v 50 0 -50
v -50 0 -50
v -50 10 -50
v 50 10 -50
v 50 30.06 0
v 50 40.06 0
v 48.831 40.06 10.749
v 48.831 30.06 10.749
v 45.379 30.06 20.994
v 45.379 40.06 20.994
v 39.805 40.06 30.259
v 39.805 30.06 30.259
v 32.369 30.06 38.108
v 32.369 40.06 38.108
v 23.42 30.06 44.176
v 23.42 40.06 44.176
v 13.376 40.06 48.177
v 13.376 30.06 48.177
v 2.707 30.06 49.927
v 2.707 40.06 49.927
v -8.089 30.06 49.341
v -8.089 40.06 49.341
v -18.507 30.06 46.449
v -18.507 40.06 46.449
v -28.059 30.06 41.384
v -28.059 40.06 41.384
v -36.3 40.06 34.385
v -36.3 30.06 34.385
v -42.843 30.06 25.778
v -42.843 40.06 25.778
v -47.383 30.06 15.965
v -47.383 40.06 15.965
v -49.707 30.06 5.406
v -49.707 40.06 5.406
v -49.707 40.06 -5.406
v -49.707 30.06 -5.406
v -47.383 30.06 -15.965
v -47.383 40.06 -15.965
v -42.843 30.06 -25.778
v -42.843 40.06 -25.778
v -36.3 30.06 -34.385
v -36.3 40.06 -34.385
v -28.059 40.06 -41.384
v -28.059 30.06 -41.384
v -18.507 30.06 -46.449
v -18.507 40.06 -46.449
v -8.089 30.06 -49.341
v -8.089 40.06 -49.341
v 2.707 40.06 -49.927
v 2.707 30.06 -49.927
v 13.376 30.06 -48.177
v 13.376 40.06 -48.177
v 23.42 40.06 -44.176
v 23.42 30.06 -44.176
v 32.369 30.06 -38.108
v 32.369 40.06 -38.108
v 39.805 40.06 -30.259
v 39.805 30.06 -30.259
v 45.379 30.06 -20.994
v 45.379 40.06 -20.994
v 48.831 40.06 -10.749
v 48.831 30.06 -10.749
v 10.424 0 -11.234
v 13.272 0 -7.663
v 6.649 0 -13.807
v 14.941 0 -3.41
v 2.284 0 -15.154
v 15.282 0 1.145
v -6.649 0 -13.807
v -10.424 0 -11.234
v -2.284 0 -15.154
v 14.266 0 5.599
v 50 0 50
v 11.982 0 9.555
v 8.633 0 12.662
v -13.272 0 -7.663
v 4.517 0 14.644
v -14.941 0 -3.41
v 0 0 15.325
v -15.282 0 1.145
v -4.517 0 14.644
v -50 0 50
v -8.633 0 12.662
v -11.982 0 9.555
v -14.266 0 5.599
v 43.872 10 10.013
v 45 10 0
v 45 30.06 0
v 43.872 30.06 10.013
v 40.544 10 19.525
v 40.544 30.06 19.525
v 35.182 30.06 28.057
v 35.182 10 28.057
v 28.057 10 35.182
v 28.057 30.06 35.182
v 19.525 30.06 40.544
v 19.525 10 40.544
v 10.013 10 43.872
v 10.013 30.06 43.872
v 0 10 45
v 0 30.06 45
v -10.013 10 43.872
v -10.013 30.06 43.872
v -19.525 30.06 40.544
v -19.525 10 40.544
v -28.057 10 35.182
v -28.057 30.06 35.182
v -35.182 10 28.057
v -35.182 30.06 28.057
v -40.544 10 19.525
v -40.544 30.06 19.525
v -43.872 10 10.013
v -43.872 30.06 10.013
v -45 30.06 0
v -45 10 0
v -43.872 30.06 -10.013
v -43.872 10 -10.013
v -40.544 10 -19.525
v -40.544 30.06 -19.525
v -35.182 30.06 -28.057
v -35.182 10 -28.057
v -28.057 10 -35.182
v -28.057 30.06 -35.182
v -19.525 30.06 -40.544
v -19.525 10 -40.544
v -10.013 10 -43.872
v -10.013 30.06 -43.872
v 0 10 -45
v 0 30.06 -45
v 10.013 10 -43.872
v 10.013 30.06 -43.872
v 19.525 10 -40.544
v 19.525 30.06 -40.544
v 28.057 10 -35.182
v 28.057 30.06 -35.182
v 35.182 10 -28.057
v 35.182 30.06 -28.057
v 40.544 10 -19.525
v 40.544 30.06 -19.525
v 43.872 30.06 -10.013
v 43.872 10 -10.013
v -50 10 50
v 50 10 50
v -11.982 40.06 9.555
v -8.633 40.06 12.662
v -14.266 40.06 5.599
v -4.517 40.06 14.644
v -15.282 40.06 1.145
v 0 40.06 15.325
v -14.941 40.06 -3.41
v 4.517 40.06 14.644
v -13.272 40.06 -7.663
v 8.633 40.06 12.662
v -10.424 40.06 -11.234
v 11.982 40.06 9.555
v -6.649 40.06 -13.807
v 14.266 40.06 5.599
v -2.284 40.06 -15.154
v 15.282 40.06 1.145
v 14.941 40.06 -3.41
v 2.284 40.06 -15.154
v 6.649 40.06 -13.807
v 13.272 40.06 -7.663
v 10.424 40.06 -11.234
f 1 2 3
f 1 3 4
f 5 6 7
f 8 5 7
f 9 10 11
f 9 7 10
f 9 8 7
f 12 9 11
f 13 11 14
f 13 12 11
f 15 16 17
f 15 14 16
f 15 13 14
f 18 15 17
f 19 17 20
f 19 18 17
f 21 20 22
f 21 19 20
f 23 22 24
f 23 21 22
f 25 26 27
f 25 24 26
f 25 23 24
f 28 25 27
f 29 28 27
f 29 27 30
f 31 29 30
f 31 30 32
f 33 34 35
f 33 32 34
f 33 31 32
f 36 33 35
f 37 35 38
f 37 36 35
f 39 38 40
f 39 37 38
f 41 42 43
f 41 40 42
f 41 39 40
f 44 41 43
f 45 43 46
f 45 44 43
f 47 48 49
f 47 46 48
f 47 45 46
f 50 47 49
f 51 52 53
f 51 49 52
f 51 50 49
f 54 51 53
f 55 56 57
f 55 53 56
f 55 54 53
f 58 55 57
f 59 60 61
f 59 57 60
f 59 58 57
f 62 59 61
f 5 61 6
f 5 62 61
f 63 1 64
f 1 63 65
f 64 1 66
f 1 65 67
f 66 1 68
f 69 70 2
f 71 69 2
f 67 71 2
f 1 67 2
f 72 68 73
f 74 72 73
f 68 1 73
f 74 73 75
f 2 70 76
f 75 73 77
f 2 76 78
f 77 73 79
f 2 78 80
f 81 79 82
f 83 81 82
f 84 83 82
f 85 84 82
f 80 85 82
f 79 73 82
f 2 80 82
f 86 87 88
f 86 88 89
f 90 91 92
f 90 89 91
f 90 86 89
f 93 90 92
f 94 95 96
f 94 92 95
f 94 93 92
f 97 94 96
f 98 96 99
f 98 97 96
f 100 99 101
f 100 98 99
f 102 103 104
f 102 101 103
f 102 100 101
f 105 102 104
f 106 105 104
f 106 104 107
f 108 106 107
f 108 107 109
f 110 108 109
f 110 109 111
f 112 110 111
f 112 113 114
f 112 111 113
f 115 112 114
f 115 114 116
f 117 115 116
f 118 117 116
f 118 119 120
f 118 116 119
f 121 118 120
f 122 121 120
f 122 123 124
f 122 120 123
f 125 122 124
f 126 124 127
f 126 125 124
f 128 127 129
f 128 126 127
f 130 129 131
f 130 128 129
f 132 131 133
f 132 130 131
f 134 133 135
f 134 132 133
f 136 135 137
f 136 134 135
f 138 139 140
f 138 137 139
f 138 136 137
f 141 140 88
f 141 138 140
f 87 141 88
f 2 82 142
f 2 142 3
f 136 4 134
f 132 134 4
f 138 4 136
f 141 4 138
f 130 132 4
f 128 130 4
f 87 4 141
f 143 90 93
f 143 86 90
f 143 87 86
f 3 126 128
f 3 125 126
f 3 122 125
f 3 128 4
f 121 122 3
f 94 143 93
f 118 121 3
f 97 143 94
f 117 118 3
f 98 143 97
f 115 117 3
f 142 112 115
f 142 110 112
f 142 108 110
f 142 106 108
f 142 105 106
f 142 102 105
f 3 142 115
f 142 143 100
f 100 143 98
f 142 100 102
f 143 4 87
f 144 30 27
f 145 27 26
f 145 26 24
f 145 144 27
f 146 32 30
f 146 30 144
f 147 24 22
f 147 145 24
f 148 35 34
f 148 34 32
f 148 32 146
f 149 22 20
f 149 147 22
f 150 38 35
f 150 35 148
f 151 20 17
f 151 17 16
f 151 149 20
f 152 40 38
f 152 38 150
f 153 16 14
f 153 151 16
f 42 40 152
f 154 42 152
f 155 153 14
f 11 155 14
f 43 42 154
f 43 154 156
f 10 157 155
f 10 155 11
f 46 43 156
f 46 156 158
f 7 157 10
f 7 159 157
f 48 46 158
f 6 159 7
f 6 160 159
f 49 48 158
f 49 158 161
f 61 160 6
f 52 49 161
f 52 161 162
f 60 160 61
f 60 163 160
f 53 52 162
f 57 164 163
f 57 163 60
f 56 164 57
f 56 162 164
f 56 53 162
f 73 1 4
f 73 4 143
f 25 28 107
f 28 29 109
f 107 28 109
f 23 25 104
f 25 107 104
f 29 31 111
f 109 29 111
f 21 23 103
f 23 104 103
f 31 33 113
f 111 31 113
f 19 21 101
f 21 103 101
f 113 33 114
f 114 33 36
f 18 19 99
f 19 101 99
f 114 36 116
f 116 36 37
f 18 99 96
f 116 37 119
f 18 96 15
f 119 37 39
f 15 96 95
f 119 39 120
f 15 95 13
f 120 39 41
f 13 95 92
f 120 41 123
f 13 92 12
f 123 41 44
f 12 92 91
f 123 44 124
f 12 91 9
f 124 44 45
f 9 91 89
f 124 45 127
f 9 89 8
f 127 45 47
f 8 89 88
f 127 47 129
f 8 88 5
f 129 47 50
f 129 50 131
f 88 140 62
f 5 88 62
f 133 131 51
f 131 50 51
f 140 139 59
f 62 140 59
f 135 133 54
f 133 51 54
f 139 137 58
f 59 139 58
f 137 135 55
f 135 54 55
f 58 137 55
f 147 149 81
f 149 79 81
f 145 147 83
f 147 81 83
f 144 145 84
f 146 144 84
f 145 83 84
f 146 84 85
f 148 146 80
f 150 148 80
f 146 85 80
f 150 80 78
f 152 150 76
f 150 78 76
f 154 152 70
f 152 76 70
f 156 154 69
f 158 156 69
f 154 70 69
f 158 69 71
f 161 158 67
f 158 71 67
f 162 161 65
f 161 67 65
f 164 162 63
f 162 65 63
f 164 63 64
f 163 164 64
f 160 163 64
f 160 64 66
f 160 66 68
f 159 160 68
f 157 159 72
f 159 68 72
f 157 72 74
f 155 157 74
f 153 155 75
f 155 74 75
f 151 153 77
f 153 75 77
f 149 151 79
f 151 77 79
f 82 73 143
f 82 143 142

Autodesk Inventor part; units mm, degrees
ref_plane "YZ Plane" through (0, 0, 0) normal (1, 0, 0) x (0, 1, 0)
ref_plane "XZ Plane" through (0, 0, 0) normal (0, 1, 0) x (-1, 0, 0)
ref_plane "XY Plane" through (0, 0, 0) normal (0, 0, 1) x (1, 0, 0)
sketch "Boceto1" plane through (0, 0, 0) normal (0, 1, 0) x (-1, 0, 0)
  line L0 (-50, 50) -> (50, 50)
  line L1 (50, 50) -> (50, -50)
  line L2 (50, -50) -> (-50, -50)
  line L3 (-50, -50) -> (-50, 50)
  line L4 (-50, 50) -> (50, -50) construction
  line L5 (50, 50) -> (-50, -50) construction
  point P0 (0, 0)
  dimension "d0" = 100
  dimension "d1" = 100
extrude "Extrusión1" add sketch "Boceto1" along normal blind 10
sketch "Boceto3" plane through (0, 10, 0) normal (0, 1, 0) x (1, 0, 0)
  point P0 (0, 0)
sketch "Boceto4" plane through (0, 10, 0) normal (0, 1, 0) x (1, 0, 0)
  circle A0 centre (0, 0) radius 45
  dimension "d5" = 90
extrude "Extrusión2" add sketch "Boceto4" along normal blind 20.06
sketch "Boceto5" plane through (0, 30.06, 0) normal (0, 1, 0) x (1, 0, 0)
  circle A0 centre (0, 0) radius 50
extrude "Extrusión3" add sketch "Boceto5" along normal blind 10
sketch "Boceto6" plane through (0, 40.06, 0) normal (0, 1, 0) x (1, 0, 0)
  circle A0 centre (0, 0) radius 15.325
  dimension "d10" = 30.65
hole "Agujero1" at (0, 40.06, 0) direction (0, -1, 0) diameter 30.65 end through all
properties part number "base de las bobinas"
